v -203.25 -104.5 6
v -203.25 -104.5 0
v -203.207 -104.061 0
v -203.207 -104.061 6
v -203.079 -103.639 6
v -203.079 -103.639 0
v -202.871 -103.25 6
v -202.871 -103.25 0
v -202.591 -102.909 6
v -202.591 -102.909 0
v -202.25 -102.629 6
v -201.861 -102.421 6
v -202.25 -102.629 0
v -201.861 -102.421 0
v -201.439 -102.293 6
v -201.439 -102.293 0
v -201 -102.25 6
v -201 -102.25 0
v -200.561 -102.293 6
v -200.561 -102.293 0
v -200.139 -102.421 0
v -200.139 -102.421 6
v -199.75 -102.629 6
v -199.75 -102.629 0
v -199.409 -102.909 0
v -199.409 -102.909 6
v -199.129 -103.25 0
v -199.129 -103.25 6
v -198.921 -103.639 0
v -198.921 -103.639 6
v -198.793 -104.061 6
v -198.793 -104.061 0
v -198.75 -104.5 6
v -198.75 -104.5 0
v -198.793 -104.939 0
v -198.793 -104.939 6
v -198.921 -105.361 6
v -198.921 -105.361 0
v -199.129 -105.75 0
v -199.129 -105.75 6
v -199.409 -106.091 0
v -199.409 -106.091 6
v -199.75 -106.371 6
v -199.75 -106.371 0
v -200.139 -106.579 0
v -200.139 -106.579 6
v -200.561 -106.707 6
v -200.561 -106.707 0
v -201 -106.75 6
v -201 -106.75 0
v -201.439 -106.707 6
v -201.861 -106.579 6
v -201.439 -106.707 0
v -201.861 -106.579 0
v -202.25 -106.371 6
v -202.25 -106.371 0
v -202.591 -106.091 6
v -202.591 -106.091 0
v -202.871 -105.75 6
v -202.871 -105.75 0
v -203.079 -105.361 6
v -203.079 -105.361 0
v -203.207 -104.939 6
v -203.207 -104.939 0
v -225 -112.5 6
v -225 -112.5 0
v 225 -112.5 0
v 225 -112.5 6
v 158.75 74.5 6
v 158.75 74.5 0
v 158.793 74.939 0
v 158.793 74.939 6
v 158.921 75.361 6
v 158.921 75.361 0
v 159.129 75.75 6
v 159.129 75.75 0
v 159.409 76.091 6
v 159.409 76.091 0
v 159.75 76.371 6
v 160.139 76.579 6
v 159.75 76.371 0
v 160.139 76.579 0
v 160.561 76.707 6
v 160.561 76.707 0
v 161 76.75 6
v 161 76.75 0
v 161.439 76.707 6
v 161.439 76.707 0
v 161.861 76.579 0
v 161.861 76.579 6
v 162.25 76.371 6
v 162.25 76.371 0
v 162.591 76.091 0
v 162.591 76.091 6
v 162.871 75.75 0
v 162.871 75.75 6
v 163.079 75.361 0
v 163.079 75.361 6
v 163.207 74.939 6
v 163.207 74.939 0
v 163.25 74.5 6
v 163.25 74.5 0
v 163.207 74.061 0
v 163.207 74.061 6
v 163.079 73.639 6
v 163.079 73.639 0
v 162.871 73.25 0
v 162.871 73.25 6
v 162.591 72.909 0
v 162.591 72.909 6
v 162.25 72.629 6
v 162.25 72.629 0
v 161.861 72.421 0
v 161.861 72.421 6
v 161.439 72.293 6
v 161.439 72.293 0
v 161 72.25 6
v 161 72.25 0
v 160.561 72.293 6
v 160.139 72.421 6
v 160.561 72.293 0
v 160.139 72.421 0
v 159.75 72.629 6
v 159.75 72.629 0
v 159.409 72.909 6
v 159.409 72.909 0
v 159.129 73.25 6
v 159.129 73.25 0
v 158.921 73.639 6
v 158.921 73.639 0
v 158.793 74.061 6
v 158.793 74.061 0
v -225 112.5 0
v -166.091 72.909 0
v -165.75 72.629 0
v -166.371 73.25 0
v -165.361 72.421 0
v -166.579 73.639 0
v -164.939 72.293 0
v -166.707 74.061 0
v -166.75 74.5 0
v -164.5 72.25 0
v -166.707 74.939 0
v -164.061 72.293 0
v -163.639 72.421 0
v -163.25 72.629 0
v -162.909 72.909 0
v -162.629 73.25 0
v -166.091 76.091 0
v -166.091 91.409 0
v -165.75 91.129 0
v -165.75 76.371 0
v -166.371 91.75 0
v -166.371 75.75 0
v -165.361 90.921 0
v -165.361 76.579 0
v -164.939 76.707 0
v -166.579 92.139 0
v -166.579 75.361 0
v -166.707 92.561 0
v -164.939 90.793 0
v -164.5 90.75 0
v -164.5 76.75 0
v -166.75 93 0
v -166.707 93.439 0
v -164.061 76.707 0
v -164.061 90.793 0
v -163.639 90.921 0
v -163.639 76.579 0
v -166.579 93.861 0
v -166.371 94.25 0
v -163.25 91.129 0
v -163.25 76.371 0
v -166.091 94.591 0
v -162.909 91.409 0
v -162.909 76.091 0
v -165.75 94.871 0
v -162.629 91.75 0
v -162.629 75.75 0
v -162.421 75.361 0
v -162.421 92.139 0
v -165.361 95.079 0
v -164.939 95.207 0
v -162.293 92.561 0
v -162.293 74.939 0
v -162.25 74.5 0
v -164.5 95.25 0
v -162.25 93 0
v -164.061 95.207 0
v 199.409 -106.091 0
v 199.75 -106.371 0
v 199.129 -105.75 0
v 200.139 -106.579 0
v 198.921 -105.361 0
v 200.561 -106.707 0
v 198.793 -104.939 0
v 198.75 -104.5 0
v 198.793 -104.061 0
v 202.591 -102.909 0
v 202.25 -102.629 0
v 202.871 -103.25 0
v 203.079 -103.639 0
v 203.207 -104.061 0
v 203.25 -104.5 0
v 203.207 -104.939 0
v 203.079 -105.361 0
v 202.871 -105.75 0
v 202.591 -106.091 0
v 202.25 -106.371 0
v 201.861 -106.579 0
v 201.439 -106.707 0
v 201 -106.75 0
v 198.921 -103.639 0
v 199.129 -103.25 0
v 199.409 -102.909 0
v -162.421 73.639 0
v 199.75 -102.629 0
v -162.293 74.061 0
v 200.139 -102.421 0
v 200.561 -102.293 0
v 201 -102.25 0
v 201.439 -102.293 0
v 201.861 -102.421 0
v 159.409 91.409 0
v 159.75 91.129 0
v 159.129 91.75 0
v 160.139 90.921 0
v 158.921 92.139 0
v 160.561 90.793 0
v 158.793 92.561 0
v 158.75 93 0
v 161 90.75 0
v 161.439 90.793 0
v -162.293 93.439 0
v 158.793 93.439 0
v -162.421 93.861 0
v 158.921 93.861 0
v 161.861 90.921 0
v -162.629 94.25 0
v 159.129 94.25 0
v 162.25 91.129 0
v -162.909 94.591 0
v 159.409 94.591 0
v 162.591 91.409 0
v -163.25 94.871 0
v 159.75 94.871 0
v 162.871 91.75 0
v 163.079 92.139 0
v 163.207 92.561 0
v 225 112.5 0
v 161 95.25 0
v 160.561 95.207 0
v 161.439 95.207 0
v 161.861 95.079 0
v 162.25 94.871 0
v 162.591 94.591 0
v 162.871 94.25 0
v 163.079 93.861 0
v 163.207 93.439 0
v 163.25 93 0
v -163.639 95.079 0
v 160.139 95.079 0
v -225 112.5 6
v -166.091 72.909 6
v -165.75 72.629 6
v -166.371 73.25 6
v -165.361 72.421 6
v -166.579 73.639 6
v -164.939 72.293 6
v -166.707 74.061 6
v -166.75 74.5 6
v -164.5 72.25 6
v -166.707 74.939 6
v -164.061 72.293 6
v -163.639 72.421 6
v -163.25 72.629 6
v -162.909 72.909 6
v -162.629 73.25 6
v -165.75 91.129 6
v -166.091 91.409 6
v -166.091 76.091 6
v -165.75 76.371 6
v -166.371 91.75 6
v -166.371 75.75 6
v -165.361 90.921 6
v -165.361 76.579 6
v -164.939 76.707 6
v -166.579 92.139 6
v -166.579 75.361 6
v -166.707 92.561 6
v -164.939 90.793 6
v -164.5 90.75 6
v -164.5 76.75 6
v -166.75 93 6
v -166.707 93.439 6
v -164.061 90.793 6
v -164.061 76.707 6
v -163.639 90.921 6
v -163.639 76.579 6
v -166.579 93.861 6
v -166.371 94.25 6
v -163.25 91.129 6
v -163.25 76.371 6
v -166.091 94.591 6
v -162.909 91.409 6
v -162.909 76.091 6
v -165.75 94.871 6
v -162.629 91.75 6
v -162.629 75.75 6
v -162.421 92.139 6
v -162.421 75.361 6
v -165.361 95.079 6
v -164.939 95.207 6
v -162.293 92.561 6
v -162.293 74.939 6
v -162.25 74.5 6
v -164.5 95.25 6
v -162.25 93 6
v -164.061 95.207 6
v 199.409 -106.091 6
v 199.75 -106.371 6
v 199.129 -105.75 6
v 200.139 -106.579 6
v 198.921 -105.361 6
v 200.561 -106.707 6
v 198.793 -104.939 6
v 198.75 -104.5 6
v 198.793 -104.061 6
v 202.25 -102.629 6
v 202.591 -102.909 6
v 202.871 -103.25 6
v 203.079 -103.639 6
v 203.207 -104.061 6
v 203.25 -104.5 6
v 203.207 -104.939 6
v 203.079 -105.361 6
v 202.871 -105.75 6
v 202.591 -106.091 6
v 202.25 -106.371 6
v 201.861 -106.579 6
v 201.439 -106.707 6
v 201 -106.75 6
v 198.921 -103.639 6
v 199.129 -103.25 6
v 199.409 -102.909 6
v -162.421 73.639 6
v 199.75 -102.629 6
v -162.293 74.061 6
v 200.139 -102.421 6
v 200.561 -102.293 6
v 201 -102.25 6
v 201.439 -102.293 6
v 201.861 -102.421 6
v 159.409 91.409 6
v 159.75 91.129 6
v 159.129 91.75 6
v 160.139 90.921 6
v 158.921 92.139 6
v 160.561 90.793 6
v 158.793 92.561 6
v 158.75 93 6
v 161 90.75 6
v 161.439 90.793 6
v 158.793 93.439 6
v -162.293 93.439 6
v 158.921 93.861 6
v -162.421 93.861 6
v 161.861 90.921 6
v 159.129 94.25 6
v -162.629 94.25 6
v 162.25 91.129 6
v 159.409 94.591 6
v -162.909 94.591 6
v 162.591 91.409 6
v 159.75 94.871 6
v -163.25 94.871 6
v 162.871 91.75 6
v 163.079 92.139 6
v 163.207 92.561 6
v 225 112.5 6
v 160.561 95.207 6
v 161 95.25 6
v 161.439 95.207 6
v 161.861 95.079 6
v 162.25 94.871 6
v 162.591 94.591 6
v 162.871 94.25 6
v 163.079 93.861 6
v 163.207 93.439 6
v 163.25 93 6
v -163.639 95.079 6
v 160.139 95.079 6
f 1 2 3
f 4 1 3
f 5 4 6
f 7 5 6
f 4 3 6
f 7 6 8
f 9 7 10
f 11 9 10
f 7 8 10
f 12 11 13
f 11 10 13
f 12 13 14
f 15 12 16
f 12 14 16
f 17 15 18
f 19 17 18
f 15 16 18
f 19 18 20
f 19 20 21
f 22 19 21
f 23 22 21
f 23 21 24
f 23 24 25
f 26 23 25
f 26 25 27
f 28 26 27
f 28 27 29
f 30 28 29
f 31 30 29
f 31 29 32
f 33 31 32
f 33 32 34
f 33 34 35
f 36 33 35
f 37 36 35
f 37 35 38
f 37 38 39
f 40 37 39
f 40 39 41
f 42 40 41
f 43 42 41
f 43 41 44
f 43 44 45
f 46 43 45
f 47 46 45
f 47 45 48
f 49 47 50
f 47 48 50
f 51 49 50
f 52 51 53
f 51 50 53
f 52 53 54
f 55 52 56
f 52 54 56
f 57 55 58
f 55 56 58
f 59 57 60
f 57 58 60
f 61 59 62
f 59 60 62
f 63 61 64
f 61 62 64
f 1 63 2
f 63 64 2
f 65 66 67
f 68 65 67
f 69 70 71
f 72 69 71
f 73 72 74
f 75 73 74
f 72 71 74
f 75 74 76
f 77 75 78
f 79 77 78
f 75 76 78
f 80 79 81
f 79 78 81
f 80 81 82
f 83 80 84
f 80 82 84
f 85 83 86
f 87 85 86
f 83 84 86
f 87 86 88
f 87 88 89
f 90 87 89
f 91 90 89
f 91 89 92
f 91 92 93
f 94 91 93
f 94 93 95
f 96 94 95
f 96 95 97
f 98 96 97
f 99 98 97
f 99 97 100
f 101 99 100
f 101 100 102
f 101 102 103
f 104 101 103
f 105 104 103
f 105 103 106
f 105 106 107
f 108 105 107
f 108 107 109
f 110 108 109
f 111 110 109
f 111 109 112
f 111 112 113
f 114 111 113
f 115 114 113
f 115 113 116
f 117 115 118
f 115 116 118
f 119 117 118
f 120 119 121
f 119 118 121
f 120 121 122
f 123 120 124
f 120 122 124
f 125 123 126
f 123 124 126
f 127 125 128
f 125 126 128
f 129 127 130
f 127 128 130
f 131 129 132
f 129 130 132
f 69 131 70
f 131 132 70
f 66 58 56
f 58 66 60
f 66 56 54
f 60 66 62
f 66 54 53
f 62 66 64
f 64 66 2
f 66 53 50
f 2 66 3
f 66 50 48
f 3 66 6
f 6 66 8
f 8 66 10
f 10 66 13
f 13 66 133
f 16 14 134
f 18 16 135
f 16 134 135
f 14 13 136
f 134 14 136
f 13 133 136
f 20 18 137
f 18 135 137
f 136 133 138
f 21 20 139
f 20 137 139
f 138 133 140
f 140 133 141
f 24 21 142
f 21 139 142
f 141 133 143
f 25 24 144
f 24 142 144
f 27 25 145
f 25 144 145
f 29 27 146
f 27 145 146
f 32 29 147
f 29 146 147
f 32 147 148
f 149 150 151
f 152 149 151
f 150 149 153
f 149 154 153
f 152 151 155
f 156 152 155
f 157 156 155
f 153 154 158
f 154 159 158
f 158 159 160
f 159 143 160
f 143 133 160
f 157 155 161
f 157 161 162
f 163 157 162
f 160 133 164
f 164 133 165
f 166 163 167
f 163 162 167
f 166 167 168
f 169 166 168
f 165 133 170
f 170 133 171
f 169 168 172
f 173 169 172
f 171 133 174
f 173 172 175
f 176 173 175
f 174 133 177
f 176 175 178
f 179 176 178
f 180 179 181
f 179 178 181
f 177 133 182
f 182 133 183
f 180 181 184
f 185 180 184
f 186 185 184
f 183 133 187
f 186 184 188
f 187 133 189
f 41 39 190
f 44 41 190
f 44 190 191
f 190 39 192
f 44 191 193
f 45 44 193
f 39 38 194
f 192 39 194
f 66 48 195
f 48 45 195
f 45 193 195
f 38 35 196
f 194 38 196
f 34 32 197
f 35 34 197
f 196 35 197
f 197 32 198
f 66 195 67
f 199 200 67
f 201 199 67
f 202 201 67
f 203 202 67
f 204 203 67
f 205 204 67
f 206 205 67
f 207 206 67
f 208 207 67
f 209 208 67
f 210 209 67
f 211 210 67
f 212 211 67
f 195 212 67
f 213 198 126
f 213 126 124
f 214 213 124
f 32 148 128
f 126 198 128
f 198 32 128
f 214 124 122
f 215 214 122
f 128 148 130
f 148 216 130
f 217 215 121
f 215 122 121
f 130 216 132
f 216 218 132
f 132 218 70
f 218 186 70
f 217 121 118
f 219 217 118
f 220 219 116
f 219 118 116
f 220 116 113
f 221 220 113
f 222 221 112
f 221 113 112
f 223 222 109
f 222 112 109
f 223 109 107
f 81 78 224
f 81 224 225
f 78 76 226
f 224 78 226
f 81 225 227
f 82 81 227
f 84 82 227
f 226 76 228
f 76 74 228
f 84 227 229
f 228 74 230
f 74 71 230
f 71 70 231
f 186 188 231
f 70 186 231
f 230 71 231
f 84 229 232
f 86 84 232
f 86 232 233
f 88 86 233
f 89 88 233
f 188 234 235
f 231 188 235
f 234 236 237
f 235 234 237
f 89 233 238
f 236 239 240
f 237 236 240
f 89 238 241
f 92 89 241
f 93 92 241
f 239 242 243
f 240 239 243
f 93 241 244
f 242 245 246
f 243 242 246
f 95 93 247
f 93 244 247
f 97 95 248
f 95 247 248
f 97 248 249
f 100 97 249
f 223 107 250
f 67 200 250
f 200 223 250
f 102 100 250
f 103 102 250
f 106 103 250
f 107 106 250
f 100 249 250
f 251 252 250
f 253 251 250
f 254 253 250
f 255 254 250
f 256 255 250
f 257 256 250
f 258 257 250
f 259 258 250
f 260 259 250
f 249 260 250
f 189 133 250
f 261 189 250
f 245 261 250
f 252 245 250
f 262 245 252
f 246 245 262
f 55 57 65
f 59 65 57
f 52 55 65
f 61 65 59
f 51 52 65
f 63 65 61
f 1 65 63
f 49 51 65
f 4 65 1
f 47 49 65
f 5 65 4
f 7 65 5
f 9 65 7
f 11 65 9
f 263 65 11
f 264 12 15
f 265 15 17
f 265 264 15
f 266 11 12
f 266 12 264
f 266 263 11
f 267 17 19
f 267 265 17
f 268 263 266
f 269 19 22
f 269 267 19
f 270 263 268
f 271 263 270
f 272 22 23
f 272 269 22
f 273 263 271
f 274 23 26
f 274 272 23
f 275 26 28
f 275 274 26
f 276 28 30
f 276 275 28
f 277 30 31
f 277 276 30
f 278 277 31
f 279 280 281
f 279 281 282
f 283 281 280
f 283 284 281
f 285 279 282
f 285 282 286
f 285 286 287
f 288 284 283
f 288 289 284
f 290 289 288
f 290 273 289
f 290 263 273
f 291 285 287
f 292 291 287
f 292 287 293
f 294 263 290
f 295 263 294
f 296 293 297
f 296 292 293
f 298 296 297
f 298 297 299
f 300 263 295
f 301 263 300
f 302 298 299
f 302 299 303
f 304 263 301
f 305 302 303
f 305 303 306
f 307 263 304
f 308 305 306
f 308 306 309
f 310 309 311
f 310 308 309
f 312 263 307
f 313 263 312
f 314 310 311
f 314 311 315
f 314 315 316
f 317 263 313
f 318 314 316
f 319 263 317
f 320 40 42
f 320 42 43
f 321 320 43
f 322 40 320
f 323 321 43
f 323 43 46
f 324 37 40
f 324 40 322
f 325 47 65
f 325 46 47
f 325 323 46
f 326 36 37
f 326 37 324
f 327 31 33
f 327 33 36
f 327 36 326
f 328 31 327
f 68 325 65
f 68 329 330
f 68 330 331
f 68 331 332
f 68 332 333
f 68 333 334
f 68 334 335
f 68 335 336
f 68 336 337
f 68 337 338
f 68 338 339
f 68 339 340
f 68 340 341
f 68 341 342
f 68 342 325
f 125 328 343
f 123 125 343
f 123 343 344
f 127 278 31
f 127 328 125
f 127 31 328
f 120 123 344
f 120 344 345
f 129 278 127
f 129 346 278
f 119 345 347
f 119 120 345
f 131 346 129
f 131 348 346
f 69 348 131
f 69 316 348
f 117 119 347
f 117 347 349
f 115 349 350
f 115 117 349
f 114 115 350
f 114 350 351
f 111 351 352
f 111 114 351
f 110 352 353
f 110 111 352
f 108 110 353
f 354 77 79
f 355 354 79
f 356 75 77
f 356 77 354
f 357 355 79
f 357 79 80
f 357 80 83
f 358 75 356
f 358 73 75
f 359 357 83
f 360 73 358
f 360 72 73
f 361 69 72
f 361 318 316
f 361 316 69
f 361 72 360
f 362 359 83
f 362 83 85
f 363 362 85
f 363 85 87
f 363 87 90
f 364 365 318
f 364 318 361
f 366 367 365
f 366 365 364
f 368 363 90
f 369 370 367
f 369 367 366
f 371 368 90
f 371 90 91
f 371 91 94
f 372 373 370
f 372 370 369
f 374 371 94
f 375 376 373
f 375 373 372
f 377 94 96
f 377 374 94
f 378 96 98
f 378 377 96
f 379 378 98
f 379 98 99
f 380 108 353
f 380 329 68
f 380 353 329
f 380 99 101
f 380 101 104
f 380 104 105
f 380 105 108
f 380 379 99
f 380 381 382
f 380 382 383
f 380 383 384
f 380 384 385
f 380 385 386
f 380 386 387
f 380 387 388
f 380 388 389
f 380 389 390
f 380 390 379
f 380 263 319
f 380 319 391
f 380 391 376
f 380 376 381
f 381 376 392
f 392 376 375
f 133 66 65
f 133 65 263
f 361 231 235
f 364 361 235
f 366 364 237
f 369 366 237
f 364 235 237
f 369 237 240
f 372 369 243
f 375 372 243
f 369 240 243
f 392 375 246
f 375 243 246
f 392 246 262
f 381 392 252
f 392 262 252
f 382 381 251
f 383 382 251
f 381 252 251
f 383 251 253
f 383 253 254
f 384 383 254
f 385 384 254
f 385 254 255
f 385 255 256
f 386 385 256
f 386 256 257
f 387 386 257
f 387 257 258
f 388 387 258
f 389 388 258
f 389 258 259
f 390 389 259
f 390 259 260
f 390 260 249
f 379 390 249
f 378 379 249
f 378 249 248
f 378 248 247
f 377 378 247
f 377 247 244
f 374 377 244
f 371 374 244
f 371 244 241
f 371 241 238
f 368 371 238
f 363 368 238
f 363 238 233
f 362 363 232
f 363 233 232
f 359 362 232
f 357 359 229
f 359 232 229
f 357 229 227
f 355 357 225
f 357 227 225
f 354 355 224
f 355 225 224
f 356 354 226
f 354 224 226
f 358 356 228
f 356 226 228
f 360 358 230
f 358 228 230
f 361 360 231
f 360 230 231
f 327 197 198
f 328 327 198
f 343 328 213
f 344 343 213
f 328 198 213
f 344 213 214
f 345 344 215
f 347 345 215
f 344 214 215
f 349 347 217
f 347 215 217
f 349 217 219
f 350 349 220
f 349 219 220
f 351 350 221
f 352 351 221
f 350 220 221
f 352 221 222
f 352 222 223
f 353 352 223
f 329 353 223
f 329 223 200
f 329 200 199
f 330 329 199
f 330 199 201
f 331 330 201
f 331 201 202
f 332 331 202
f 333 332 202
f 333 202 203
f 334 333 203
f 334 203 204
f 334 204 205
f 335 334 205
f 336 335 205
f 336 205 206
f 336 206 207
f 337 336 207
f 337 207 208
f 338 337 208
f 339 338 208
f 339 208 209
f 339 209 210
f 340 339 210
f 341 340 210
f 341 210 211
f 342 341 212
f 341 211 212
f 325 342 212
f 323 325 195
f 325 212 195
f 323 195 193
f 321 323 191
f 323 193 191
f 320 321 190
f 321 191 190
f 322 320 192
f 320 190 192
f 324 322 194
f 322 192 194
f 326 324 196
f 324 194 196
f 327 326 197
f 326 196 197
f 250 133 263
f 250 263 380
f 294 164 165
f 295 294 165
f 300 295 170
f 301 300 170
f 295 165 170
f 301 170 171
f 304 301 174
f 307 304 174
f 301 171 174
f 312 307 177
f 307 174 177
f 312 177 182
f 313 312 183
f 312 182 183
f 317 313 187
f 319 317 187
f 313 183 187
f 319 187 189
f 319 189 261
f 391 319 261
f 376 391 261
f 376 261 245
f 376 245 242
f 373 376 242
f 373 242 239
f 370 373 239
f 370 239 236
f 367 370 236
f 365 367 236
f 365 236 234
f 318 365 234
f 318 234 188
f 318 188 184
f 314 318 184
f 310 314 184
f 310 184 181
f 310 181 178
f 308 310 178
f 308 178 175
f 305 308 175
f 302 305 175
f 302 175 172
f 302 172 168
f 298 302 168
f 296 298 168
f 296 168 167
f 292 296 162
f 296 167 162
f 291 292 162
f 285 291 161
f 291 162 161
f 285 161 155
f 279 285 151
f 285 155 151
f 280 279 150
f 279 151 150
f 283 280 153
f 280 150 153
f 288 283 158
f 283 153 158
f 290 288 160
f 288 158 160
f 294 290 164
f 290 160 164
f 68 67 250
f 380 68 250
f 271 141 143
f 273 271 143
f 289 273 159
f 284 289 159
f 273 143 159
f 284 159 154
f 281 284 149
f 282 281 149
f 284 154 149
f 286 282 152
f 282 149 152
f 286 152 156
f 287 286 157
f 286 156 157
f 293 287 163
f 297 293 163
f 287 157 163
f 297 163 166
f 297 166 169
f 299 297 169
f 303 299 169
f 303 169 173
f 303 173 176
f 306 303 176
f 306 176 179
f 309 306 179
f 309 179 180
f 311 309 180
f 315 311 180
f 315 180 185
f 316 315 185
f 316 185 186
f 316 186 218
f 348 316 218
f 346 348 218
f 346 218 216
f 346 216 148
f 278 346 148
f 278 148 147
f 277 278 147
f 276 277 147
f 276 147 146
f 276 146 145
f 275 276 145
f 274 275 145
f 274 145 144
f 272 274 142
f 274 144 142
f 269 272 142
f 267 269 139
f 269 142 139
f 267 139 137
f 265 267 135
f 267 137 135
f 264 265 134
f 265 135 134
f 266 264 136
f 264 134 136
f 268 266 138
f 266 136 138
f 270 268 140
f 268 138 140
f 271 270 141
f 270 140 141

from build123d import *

# Parameters (mm, degrees)
SCHIZZO1_W                   = 450
SCHIZZO1_H                   = 225
ESTRUSIONE_ESTRUSIONE1_DEPTH = 6
SCHIZZO2_R                   = 2.25
TAGLIO_ESTRUSIONE1_DEPTH     = 10
SCHIZZO3_R                   = 2.25
TAGLIO_ESTRUSIONE2_DEPTH     = 10


with BuildPart() as part:
    # Schizzo1 → Estrusione-Estrusione1 (new body)
    with BuildSketch(Plane.XY):
        Rectangle(SCHIZZO1_W, SCHIZZO1_H)
    extrude(amount=ESTRUSIONE_ESTRUSIONE1_DEPTH)

    # Schizzo2 → Taglio-Estrusione1 (cut)
    with BuildSketch(Plane(origin=(0, 0, 0), x_dir=(-1, 0, 0), z_dir=(0, 0, -1))):
        with Locations((-161, 93)):
            Circle(SCHIZZO2_R)
        with Locations((-161, 74.5)):
            Circle(SCHIZZO2_R)
        with Locations((164.5, 93)):
            Circle(SCHIZZO2_R)
        with Locations((164.5, 74.5)):
            Circle(SCHIZZO2_R)
    extrude(amount=-TAGLIO_ESTRUSIONE1_DEPTH, mode=Mode.SUBTRACT)

    # Schizzo3 → Taglio-Estrusione2 (cut)
    with BuildSketch(Plane(origin=(0, 0, 0), x_dir=(-1, 0, 0), z_dir=(0, 0, -1))):
        with Locations((201, -104.5)):
            Circle(SCHIZZO3_R)
        with Locations((-201, -104.5)):
            Circle(SCHIZZO3_R)
    extrude(amount=-TAGLIO_ESTRUSIONE2_DEPTH, mode=Mode.SUBTRACT)


solid = part.part
